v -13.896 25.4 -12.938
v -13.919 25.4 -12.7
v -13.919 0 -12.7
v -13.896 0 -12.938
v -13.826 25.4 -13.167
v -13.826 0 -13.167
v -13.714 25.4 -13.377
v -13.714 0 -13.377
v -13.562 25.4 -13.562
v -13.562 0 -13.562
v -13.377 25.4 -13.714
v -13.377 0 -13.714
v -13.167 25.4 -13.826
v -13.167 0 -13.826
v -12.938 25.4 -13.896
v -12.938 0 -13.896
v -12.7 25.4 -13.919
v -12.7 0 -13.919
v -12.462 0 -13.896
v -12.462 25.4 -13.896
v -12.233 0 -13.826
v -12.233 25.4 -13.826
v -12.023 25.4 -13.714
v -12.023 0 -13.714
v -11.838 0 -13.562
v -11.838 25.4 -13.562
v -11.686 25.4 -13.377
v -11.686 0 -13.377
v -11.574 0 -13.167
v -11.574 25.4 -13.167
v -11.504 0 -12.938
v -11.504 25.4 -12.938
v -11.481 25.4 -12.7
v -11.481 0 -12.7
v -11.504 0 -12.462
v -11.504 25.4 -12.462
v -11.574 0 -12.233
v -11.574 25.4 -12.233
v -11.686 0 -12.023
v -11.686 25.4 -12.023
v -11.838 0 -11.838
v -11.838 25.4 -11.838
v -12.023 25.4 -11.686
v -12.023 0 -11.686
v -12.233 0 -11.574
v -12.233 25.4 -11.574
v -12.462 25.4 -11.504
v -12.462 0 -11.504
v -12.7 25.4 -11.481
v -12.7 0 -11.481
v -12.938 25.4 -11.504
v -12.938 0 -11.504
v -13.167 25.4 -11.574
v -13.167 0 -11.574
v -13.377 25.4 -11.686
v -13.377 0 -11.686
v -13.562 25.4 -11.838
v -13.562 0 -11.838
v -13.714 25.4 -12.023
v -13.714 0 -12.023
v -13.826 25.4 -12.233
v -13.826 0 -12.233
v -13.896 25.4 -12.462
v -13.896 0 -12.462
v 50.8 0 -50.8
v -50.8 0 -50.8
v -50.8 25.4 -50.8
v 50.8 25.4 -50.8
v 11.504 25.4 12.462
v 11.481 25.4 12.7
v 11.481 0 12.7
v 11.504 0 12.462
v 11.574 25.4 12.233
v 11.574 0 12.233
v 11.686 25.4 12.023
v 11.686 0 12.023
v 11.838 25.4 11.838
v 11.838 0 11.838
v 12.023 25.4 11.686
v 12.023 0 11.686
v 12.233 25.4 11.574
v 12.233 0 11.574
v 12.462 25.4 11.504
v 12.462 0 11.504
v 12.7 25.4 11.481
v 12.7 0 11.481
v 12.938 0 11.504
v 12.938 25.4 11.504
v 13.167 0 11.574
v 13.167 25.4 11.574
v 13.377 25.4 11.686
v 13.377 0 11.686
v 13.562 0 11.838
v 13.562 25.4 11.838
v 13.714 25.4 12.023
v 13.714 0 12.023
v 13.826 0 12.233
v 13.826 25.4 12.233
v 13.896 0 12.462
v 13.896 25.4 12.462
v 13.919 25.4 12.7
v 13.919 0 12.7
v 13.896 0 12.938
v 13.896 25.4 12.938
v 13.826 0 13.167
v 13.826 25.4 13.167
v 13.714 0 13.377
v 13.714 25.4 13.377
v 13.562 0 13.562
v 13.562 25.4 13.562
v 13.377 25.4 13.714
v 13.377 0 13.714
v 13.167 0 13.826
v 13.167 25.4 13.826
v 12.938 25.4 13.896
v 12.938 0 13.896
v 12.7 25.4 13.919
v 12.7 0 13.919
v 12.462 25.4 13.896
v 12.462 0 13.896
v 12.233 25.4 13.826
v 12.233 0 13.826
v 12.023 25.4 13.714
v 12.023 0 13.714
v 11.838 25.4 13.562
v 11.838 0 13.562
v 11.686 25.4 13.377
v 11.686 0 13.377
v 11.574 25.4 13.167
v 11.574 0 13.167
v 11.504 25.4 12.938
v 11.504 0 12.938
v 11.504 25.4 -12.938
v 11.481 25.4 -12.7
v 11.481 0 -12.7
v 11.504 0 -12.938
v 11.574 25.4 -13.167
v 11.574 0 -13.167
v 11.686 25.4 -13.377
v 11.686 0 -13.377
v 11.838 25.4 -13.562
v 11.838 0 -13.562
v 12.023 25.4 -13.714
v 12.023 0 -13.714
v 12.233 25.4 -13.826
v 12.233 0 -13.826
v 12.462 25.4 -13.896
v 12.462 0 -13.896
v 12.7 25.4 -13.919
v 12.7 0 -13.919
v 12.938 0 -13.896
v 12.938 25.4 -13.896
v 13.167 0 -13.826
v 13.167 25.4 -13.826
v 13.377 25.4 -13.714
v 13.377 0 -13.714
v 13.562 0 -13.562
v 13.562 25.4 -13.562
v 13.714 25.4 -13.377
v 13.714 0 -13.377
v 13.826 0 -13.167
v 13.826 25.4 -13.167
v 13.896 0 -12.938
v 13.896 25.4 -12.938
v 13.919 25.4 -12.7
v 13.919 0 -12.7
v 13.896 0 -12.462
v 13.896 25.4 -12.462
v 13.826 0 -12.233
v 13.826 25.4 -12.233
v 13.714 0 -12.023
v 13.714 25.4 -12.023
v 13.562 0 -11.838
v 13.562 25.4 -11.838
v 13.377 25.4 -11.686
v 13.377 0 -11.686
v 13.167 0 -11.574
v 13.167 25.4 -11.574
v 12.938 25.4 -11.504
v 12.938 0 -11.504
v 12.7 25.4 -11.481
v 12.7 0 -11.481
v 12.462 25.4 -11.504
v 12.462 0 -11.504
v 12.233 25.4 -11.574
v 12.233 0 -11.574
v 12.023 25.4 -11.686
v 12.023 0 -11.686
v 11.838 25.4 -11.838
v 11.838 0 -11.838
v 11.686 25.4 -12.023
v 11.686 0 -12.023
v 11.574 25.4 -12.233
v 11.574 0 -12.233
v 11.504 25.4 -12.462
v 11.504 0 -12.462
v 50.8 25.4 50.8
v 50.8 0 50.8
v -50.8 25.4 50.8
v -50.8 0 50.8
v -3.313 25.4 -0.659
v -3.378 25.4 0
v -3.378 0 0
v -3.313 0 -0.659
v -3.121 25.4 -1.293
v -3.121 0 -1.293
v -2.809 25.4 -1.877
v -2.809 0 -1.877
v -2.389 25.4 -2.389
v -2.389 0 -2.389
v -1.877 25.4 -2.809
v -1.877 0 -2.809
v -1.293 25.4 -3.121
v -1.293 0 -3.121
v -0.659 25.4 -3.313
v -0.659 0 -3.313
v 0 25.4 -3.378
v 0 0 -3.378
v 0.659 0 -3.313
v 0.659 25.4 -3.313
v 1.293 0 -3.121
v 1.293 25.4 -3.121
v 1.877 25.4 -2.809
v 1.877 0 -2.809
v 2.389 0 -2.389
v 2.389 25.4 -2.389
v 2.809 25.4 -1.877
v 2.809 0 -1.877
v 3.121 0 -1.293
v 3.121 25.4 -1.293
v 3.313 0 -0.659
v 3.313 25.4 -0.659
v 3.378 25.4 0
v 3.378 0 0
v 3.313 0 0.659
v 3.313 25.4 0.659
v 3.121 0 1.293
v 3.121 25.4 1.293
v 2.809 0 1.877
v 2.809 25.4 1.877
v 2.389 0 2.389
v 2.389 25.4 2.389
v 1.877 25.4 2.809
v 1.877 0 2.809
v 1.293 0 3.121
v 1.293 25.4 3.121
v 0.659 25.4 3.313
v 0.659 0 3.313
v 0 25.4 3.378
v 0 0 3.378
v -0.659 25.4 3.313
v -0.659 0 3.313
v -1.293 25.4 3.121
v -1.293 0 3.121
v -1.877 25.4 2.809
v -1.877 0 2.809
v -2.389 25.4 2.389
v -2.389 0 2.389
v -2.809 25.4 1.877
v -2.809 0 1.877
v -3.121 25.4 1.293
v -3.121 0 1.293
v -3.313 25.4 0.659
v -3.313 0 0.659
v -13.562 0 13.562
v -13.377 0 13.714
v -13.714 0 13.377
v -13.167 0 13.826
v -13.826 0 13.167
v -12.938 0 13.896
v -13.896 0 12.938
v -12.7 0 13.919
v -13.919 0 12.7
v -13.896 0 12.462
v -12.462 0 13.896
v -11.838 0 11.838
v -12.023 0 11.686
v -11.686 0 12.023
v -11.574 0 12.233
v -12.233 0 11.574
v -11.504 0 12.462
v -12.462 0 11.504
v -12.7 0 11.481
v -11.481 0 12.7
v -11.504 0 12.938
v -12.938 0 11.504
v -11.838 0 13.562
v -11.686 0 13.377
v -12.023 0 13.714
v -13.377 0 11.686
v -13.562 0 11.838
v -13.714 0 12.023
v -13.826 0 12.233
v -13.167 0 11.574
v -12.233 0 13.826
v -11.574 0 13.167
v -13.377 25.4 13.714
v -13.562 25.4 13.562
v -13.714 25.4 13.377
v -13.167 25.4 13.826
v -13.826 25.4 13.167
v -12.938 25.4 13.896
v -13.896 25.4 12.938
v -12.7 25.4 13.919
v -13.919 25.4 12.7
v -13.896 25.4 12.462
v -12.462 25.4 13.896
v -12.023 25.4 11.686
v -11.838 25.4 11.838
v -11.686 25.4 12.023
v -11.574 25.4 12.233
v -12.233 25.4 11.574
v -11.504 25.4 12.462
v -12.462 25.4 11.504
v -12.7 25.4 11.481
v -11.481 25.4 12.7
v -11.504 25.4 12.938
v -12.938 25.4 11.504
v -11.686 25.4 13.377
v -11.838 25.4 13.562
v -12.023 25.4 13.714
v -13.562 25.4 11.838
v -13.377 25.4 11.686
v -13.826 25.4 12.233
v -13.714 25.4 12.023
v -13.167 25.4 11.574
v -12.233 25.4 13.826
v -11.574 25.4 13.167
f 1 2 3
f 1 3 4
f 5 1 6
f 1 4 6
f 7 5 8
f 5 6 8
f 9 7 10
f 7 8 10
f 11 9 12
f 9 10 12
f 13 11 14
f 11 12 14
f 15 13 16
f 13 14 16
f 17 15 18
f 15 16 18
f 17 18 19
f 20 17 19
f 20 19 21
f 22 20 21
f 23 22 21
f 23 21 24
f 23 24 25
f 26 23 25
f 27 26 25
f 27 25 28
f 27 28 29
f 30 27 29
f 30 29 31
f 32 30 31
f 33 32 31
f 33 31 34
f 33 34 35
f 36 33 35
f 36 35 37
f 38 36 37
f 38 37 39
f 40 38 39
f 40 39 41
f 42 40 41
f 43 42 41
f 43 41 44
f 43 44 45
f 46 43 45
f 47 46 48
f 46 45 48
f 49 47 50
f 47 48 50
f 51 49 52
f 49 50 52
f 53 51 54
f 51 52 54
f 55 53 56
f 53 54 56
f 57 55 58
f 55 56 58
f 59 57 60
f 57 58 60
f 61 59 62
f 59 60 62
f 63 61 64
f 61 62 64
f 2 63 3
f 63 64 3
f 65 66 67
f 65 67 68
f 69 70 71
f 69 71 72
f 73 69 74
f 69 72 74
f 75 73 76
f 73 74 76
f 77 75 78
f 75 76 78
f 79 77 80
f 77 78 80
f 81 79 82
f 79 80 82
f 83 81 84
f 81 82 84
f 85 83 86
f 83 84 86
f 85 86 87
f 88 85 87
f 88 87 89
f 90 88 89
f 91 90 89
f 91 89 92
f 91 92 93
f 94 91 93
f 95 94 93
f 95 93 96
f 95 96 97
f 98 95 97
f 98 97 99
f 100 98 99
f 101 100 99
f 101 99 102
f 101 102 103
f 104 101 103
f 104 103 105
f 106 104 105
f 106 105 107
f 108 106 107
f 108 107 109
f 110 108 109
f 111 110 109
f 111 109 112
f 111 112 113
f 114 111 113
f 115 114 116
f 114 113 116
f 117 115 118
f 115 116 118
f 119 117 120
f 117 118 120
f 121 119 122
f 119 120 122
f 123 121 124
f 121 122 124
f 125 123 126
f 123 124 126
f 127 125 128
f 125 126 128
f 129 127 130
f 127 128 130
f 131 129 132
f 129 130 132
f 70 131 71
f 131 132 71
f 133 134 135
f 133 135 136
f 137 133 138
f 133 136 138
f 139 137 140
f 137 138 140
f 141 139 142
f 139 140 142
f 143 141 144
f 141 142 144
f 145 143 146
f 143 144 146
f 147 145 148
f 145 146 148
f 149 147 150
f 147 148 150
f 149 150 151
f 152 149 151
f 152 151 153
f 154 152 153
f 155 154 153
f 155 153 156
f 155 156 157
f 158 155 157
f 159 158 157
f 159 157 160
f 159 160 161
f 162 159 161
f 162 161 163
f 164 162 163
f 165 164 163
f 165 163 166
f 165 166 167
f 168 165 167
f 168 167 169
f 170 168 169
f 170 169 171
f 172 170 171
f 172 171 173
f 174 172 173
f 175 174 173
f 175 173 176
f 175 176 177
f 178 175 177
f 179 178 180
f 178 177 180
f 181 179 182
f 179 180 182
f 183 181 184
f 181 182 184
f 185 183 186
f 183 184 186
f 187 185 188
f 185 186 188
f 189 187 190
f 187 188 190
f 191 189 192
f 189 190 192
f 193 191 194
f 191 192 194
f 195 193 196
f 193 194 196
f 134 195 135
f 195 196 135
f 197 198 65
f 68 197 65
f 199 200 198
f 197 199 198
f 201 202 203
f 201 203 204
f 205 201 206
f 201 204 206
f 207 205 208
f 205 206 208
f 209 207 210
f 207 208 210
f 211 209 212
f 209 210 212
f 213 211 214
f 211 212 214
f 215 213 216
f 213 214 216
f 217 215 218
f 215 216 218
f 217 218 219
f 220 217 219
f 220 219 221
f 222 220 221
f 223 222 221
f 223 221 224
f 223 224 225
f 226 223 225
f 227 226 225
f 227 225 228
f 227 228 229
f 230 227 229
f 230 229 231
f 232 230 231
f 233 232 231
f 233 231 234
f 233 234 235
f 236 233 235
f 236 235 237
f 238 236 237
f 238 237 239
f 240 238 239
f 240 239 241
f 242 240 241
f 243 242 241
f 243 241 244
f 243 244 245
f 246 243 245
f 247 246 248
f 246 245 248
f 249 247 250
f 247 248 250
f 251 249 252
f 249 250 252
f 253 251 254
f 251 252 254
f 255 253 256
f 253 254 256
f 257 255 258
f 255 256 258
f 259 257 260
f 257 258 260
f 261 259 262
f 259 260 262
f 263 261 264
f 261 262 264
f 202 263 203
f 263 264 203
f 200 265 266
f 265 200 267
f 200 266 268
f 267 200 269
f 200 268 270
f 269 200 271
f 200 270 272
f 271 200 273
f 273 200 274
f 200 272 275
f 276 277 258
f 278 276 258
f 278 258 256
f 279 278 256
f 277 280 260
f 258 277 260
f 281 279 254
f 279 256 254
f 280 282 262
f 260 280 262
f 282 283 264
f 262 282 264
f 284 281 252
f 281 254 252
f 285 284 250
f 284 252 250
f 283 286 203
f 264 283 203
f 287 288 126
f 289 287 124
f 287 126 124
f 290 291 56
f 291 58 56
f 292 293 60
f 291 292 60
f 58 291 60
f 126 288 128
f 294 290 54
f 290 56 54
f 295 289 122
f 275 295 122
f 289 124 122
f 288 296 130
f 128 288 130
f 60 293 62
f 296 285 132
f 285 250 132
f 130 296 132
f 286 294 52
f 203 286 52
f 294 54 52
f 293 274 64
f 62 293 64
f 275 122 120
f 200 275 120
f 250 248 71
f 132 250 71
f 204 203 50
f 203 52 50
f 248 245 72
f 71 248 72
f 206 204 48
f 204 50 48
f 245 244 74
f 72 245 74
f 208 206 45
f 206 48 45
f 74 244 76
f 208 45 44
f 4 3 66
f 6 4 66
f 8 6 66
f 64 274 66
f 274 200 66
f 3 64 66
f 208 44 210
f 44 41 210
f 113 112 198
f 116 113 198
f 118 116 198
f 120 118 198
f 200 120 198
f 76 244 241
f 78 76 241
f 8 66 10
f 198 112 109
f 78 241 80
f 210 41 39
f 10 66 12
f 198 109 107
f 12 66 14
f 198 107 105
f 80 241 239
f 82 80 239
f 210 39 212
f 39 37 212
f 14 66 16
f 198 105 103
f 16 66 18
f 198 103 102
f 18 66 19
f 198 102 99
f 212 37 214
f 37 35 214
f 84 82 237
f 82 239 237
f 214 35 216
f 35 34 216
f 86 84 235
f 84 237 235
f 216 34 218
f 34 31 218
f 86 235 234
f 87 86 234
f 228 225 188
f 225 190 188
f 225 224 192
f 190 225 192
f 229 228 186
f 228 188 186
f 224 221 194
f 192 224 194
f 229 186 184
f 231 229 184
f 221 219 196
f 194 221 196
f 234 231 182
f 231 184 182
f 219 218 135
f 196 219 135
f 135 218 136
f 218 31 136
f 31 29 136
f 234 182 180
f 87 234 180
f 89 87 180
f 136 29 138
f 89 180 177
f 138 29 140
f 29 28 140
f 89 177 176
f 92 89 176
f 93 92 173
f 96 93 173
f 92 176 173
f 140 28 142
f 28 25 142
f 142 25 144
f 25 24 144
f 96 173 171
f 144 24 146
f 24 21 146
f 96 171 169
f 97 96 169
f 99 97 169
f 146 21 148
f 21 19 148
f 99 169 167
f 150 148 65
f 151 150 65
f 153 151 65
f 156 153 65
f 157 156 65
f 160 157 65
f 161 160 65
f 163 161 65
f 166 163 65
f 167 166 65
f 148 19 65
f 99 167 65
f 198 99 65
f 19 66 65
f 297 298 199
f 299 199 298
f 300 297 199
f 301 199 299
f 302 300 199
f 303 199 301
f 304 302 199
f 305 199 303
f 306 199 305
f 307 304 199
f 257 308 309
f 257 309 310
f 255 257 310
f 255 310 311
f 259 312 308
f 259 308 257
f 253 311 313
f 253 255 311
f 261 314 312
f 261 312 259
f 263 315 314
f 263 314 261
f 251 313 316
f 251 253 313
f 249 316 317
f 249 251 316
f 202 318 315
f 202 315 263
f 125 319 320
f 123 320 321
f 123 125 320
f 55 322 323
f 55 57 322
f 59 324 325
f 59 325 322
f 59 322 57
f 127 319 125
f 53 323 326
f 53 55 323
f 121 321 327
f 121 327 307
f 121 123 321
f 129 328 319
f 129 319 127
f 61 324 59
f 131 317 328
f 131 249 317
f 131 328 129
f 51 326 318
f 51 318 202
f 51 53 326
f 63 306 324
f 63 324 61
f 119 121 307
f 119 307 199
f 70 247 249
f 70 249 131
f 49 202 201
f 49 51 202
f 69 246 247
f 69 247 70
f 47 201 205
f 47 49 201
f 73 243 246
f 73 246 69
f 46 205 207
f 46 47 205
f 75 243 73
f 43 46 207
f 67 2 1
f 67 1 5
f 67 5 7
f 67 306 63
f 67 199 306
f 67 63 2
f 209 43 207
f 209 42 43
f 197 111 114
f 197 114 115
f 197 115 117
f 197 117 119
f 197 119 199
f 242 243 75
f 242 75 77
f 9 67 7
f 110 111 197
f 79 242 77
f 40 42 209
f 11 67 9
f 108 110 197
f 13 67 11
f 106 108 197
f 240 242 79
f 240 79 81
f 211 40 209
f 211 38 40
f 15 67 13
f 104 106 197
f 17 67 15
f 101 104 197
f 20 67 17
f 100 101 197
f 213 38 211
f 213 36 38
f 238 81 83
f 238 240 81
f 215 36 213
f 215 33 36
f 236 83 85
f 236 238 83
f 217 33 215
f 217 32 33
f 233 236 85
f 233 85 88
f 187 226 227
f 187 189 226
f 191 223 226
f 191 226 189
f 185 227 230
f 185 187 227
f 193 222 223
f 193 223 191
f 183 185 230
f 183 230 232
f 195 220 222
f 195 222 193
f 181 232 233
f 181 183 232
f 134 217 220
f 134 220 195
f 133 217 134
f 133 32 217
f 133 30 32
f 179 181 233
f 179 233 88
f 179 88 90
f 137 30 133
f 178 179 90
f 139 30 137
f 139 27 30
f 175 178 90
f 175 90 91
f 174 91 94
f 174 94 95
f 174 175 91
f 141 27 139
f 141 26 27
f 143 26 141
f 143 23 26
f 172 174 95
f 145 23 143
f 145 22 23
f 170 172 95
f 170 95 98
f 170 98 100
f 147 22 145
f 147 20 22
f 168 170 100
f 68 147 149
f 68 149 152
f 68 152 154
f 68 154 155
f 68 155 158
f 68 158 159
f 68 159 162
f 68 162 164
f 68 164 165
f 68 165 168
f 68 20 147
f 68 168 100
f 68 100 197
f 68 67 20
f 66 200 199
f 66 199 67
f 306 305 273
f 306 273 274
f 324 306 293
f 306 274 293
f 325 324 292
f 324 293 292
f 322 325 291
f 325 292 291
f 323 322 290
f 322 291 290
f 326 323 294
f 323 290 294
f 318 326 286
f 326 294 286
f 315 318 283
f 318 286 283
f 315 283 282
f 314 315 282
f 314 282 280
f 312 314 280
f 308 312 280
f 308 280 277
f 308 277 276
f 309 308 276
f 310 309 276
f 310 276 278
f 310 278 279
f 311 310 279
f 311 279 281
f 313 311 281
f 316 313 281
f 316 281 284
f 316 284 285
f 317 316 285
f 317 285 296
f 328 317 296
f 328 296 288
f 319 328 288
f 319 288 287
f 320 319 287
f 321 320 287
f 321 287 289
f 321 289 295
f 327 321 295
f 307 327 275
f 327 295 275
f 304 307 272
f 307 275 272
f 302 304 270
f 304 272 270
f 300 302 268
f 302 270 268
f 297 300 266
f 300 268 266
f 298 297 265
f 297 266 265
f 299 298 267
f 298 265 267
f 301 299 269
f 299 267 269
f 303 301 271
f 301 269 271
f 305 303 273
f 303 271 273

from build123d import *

# Parameters (mm, degrees)
SKETCH1_W               = 101.6
SKETCH1_H               = 101.6
BOSS_EXTRUDE1_DEPTH     = 25.4
F_1_4_CLEARANCE_HOLE1_D = 6.7564
F_2_CLEARANCE_HOLE1_D   = 2.4384
F_2_CLEARANCE_HOLE2_D   = 2.4384


with BuildPart() as part:
    # Sketch1 → Boss-Extrude1 (new body)
    with BuildSketch(Plane(origin=(0, 0, 0), x_dir=(1, 0, 0), z_dir=(0, 1, 0))):
        Rectangle(SKETCH1_W, SKETCH1_H)
    extrude(amount=BOSS_EXTRUDE1_DEPTH)

    # 1/4 Clearance Hole1 (through all)
    with Locations(Plane(origin=(0, 25.4, 0), x_dir=(1, 0, 0), z_dir=(0, 1, 0))):
        with Locations((0, 0)):
            Hole(F_1_4_CLEARANCE_HOLE1_D / 2)

    # #2 Clearance Hole1 (through all)
    with Locations(Plane(origin=(0, 25.4, 0), x_dir=(1, 0, 0), z_dir=(0, 1, 0))):
        with Locations((-12.7, 12.7), (0, 0)):
            Hole(F_2_CLEARANCE_HOLE1_D / 2)

    # #2 Clearance Hole2 (through all)
    with Locations(Plane(origin=(0, 25.4, 0), x_dir=(1, 0, 0), z_dir=(0, 1, 0))):
        with Locations((12.7, 12.7), (-12.7, -12.7), (12.7, -12.7)):
            Hole(F_2_CLEARANCE_HOLE2_D / 2)


solid = part.part
